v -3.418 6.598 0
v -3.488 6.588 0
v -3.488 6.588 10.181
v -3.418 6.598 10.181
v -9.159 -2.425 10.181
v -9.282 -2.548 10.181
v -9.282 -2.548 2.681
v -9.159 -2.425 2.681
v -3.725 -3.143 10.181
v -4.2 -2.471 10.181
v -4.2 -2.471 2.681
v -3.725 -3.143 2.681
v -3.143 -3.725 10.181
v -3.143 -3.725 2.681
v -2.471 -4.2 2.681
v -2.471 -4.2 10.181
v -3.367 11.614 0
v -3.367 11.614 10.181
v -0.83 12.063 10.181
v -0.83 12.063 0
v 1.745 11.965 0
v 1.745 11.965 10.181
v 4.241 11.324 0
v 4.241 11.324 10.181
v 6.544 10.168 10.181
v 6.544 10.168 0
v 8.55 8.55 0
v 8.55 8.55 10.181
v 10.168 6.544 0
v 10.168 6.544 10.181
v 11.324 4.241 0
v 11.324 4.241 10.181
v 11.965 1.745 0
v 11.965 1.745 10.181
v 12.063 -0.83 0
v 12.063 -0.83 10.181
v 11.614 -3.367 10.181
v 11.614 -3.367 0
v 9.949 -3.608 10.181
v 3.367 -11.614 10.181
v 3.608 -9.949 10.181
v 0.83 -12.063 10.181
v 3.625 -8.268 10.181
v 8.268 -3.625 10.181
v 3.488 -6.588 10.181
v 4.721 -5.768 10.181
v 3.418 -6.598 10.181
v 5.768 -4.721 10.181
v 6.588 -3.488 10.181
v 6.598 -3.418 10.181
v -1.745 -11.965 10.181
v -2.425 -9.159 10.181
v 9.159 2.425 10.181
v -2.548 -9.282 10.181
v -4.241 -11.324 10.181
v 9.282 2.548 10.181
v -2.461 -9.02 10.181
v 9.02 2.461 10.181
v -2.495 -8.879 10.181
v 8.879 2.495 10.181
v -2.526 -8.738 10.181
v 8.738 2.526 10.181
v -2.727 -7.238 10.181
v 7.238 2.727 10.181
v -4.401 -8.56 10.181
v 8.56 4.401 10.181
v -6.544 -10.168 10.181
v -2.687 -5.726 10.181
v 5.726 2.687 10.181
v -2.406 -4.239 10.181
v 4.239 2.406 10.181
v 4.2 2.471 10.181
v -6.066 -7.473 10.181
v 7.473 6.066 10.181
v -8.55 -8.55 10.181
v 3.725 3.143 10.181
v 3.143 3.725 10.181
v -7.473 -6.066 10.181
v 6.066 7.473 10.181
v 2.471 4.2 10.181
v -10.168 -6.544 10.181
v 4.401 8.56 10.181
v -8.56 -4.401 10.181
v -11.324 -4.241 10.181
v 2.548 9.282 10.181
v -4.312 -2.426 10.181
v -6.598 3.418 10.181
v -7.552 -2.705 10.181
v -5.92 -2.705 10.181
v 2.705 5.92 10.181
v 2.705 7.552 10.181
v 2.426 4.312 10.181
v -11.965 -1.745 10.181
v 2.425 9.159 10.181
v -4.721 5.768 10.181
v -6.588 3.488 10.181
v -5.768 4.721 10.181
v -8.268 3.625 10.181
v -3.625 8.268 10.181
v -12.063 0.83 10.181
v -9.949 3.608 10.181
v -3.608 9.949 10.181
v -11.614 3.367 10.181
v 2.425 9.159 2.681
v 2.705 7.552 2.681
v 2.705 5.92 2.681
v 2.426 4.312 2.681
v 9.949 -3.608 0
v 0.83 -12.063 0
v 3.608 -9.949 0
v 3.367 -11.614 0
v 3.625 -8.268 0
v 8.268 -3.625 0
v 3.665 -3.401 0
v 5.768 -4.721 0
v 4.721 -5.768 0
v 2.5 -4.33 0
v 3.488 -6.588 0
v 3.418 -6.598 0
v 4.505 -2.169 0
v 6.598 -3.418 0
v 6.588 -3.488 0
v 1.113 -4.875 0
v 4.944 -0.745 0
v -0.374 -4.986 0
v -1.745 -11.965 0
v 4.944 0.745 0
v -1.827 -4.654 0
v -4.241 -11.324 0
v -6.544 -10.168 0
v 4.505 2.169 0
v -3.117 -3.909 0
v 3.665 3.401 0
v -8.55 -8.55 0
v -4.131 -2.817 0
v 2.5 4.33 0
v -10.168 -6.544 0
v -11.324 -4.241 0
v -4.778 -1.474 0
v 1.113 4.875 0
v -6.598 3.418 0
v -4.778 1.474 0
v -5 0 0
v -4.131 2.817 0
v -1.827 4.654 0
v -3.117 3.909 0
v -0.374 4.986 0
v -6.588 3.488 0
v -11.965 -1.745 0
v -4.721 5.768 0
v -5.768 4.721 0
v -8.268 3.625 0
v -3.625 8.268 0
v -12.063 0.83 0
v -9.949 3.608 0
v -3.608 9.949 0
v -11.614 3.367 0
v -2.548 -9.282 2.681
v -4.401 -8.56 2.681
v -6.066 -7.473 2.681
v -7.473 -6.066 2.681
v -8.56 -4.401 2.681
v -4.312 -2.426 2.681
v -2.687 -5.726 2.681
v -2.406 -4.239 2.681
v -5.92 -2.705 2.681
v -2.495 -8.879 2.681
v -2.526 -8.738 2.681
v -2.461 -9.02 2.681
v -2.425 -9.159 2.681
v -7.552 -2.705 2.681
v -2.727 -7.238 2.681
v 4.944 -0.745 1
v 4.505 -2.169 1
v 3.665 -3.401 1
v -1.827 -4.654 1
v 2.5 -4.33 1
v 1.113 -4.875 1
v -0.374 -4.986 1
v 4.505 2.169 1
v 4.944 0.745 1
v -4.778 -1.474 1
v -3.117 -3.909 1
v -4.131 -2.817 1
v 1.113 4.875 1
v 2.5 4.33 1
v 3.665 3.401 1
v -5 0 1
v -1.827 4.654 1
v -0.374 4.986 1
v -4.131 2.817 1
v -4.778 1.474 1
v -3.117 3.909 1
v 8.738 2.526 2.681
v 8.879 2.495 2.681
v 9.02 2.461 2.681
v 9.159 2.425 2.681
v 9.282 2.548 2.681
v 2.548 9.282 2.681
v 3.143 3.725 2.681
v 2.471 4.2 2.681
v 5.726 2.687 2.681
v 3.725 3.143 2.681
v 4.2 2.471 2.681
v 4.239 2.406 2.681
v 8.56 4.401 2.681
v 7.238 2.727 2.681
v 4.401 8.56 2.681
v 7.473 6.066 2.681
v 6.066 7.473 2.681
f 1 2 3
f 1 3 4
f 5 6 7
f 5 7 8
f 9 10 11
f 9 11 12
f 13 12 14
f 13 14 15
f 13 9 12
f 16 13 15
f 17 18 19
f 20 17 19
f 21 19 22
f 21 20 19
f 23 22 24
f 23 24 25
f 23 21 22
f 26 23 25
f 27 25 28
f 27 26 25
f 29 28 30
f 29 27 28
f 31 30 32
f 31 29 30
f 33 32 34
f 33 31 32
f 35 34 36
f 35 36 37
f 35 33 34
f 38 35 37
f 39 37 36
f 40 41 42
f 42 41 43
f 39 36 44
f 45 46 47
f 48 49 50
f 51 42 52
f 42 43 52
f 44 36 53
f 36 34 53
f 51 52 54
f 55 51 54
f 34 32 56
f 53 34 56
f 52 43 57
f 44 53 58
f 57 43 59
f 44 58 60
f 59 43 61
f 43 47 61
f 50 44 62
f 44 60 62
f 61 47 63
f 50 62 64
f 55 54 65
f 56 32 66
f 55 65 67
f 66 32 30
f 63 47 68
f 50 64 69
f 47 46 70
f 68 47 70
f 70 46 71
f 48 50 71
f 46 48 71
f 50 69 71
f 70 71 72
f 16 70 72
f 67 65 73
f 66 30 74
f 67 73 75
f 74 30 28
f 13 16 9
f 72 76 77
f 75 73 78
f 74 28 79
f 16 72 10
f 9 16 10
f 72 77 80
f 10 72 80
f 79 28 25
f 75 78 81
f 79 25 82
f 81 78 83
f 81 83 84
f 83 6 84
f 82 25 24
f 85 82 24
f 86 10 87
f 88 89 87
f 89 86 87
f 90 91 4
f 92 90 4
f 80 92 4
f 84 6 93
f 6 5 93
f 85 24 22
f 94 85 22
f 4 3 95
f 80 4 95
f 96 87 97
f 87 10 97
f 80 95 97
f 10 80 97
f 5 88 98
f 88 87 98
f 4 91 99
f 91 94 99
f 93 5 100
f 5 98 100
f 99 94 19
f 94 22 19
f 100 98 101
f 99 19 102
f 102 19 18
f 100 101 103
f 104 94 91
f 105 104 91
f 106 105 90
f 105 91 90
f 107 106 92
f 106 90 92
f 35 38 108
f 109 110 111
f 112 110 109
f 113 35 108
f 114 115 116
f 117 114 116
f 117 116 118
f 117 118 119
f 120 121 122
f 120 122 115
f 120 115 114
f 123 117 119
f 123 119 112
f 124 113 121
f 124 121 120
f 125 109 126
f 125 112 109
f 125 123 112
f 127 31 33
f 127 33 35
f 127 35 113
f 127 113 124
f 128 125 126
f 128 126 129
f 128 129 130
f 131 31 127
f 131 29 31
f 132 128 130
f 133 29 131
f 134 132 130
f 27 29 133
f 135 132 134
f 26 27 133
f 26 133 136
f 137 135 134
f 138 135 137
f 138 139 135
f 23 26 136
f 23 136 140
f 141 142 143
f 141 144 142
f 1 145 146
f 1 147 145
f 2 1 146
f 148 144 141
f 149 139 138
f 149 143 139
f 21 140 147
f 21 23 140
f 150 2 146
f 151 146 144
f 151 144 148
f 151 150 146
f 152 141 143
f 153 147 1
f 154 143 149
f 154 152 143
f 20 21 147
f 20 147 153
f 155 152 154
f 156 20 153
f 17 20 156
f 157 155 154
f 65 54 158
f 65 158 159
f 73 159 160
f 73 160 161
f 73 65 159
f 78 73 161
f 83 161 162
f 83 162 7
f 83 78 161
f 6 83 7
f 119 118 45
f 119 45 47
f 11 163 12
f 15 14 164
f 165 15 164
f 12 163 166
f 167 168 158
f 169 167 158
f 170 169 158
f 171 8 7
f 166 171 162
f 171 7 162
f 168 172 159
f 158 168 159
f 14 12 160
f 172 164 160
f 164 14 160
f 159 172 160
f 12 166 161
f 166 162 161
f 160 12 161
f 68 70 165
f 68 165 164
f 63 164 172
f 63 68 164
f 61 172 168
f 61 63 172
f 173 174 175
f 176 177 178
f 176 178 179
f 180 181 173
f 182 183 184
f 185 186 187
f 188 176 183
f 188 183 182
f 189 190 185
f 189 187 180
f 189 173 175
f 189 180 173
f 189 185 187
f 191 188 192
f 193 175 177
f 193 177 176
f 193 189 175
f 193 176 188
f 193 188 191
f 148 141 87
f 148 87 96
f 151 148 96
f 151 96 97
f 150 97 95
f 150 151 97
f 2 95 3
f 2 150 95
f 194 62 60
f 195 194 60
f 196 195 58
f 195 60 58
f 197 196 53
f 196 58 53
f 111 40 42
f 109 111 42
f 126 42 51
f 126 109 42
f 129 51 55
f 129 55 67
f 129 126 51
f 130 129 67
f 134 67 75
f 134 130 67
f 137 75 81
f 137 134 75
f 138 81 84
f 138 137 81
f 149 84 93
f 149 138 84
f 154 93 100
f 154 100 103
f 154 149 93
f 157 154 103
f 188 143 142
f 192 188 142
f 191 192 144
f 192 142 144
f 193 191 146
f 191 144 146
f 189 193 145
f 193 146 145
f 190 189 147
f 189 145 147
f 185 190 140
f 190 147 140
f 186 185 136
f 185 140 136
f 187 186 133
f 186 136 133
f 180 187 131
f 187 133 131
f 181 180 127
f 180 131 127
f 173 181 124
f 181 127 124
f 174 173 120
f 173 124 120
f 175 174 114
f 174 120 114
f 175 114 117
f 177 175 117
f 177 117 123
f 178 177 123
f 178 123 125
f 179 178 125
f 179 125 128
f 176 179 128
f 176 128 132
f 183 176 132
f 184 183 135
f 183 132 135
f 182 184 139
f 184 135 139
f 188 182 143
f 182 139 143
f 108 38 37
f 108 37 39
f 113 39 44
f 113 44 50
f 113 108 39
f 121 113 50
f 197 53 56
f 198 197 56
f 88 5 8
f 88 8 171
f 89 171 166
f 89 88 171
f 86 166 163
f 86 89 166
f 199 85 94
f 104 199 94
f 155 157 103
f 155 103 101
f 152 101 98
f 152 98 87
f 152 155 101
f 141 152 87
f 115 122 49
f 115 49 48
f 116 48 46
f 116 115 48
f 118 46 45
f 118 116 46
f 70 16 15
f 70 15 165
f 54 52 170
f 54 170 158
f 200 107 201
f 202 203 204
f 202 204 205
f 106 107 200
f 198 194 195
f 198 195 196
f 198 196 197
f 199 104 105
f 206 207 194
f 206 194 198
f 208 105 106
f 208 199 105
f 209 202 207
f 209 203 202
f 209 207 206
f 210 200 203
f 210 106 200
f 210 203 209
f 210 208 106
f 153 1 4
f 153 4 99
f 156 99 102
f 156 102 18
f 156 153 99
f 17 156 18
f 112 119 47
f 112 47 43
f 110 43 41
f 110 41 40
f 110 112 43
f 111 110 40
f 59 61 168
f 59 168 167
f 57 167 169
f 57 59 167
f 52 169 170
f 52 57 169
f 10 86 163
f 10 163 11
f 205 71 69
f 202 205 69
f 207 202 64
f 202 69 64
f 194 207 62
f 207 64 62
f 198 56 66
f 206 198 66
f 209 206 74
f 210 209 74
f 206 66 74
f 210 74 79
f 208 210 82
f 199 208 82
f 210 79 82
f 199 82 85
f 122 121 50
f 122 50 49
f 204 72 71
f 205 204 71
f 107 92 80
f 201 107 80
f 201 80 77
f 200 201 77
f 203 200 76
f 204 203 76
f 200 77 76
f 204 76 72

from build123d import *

# Parameters (mm, degrees)
BOSS_EXTRUDE1_DEPTH = 10.181166667
SKETCH2_R           = 5
CUT_EXTRUDE1_DEPTH  = 1
CUT_EXTRUDE2_DEPTH  = 7.5


with BuildPart() as part:
    # Sketch1 → Boss-Extrude1 (new body)
    with BuildSketch(Plane.XY):
        with BuildLine():
            Line((-6.59848134, 3.41844841), (-6.587531167, 3.487972592))
            ThreePointArc((-6.587531167, 3.487972592), (-5.270745663, 5.270745663), (-3.487972592, 6.587531167))
            Line((-3.487972592, 6.587531167), (-3.41844841, 6.59848134))
            ThreePointArc((-3.41844841, 6.59848134), (-3.64449132, 9.108619705), (-3.367456173, 11.613642965))
            ThreePointArc((-3.367456173, 11.613642965), (8.550335198, 8.550335198), (11.613642965, -3.367456173))
            ThreePointArc((11.613642965, -3.367456173), (9.108619705, -3.64449132), (6.59848134, -3.41844841))
            Line((6.59848134, -3.41844841), (6.587531167, -3.487972592))
            ThreePointArc((6.587531167, -3.487972592), (5.270745663, -5.270745663), (3.487972592, -6.587531167))
            Line((3.487972592, -6.587531167), (3.41844841, -6.59848134))
            ThreePointArc((3.41844841, -6.59848134), (3.64449132, -9.108619705), (3.367456173, -11.613642965))
            ThreePointArc((3.367456173, -11.613642965), (-8.550335198, -8.550335198), (-11.613642965, 3.367456173))
            ThreePointArc((-11.613642965, 3.367456173), (-9.108619705, 3.64449132), (-6.59848134, 3.41844841))
        make_face()
    extrude(amount=BOSS_EXTRUDE1_DEPTH)

    # Sketch2 → Cut-Extrude1 (cut)
    with BuildSketch(Plane(origin=(0, 0, 0), x_dir=(-1, 0, 0), z_dir=(0, 0, -1))):
        Circle(SKETCH2_R)
    extrude(amount=-CUT_EXTRUDE1_DEPTH, mode=Mode.SUBTRACT)

    # Sketch3 → Cut-Extrude2 (cut)
    with BuildSketch(Plane.XY.offset(10.181166667)):
        with BuildLine():
            Line((9.15948917, 2.425242905), (9.281504474, 2.548391591))
            ThreePointArc((9.281504474, 2.548391591), (6.805902769, 6.805902769), (2.548391591, 9.281504474))
            Line((2.548391591, 9.281504474), (2.425242905, 9.15948917))
            ThreePointArc((2.425242905, 9.15948917), (2.740607895, 6.73570708), (2.425506361, 4.311890725))
            Line((2.425506361, 4.311890725), (2.4714668, 4.200130912))
            ThreePointArc((2.4714668, 4.200130912), (3.445957619, 3.445957619), (4.200130912, 2.4714668))
            Line((4.200130912, 2.4714668), (4.238745161, 2.405843866))
            ThreePointArc((4.238745161, 2.405843866), (6.481209779, 2.737203521), (8.738209013, 2.5264875))
            ThreePointArc((8.738209013, 2.5264875), (8.949427835, 2.478273365), (9.15948917, 2.425242905))
        make_face()
    cut_extrude2 = extrude(amount=-CUT_EXTRUDE2_DEPTH, mode=Mode.SUBTRACT)

    # Mirror1: Cut-Extrude2 across plane
    add(cut_extrude2.mirror(Plane(origin=(0, 0, 0), x_dir=(0, 0, 1), z_dir=(0.7071067811865475, 0.7071067811865477, 0))), mode=Mode.SUBTRACT)


solid = part.part
